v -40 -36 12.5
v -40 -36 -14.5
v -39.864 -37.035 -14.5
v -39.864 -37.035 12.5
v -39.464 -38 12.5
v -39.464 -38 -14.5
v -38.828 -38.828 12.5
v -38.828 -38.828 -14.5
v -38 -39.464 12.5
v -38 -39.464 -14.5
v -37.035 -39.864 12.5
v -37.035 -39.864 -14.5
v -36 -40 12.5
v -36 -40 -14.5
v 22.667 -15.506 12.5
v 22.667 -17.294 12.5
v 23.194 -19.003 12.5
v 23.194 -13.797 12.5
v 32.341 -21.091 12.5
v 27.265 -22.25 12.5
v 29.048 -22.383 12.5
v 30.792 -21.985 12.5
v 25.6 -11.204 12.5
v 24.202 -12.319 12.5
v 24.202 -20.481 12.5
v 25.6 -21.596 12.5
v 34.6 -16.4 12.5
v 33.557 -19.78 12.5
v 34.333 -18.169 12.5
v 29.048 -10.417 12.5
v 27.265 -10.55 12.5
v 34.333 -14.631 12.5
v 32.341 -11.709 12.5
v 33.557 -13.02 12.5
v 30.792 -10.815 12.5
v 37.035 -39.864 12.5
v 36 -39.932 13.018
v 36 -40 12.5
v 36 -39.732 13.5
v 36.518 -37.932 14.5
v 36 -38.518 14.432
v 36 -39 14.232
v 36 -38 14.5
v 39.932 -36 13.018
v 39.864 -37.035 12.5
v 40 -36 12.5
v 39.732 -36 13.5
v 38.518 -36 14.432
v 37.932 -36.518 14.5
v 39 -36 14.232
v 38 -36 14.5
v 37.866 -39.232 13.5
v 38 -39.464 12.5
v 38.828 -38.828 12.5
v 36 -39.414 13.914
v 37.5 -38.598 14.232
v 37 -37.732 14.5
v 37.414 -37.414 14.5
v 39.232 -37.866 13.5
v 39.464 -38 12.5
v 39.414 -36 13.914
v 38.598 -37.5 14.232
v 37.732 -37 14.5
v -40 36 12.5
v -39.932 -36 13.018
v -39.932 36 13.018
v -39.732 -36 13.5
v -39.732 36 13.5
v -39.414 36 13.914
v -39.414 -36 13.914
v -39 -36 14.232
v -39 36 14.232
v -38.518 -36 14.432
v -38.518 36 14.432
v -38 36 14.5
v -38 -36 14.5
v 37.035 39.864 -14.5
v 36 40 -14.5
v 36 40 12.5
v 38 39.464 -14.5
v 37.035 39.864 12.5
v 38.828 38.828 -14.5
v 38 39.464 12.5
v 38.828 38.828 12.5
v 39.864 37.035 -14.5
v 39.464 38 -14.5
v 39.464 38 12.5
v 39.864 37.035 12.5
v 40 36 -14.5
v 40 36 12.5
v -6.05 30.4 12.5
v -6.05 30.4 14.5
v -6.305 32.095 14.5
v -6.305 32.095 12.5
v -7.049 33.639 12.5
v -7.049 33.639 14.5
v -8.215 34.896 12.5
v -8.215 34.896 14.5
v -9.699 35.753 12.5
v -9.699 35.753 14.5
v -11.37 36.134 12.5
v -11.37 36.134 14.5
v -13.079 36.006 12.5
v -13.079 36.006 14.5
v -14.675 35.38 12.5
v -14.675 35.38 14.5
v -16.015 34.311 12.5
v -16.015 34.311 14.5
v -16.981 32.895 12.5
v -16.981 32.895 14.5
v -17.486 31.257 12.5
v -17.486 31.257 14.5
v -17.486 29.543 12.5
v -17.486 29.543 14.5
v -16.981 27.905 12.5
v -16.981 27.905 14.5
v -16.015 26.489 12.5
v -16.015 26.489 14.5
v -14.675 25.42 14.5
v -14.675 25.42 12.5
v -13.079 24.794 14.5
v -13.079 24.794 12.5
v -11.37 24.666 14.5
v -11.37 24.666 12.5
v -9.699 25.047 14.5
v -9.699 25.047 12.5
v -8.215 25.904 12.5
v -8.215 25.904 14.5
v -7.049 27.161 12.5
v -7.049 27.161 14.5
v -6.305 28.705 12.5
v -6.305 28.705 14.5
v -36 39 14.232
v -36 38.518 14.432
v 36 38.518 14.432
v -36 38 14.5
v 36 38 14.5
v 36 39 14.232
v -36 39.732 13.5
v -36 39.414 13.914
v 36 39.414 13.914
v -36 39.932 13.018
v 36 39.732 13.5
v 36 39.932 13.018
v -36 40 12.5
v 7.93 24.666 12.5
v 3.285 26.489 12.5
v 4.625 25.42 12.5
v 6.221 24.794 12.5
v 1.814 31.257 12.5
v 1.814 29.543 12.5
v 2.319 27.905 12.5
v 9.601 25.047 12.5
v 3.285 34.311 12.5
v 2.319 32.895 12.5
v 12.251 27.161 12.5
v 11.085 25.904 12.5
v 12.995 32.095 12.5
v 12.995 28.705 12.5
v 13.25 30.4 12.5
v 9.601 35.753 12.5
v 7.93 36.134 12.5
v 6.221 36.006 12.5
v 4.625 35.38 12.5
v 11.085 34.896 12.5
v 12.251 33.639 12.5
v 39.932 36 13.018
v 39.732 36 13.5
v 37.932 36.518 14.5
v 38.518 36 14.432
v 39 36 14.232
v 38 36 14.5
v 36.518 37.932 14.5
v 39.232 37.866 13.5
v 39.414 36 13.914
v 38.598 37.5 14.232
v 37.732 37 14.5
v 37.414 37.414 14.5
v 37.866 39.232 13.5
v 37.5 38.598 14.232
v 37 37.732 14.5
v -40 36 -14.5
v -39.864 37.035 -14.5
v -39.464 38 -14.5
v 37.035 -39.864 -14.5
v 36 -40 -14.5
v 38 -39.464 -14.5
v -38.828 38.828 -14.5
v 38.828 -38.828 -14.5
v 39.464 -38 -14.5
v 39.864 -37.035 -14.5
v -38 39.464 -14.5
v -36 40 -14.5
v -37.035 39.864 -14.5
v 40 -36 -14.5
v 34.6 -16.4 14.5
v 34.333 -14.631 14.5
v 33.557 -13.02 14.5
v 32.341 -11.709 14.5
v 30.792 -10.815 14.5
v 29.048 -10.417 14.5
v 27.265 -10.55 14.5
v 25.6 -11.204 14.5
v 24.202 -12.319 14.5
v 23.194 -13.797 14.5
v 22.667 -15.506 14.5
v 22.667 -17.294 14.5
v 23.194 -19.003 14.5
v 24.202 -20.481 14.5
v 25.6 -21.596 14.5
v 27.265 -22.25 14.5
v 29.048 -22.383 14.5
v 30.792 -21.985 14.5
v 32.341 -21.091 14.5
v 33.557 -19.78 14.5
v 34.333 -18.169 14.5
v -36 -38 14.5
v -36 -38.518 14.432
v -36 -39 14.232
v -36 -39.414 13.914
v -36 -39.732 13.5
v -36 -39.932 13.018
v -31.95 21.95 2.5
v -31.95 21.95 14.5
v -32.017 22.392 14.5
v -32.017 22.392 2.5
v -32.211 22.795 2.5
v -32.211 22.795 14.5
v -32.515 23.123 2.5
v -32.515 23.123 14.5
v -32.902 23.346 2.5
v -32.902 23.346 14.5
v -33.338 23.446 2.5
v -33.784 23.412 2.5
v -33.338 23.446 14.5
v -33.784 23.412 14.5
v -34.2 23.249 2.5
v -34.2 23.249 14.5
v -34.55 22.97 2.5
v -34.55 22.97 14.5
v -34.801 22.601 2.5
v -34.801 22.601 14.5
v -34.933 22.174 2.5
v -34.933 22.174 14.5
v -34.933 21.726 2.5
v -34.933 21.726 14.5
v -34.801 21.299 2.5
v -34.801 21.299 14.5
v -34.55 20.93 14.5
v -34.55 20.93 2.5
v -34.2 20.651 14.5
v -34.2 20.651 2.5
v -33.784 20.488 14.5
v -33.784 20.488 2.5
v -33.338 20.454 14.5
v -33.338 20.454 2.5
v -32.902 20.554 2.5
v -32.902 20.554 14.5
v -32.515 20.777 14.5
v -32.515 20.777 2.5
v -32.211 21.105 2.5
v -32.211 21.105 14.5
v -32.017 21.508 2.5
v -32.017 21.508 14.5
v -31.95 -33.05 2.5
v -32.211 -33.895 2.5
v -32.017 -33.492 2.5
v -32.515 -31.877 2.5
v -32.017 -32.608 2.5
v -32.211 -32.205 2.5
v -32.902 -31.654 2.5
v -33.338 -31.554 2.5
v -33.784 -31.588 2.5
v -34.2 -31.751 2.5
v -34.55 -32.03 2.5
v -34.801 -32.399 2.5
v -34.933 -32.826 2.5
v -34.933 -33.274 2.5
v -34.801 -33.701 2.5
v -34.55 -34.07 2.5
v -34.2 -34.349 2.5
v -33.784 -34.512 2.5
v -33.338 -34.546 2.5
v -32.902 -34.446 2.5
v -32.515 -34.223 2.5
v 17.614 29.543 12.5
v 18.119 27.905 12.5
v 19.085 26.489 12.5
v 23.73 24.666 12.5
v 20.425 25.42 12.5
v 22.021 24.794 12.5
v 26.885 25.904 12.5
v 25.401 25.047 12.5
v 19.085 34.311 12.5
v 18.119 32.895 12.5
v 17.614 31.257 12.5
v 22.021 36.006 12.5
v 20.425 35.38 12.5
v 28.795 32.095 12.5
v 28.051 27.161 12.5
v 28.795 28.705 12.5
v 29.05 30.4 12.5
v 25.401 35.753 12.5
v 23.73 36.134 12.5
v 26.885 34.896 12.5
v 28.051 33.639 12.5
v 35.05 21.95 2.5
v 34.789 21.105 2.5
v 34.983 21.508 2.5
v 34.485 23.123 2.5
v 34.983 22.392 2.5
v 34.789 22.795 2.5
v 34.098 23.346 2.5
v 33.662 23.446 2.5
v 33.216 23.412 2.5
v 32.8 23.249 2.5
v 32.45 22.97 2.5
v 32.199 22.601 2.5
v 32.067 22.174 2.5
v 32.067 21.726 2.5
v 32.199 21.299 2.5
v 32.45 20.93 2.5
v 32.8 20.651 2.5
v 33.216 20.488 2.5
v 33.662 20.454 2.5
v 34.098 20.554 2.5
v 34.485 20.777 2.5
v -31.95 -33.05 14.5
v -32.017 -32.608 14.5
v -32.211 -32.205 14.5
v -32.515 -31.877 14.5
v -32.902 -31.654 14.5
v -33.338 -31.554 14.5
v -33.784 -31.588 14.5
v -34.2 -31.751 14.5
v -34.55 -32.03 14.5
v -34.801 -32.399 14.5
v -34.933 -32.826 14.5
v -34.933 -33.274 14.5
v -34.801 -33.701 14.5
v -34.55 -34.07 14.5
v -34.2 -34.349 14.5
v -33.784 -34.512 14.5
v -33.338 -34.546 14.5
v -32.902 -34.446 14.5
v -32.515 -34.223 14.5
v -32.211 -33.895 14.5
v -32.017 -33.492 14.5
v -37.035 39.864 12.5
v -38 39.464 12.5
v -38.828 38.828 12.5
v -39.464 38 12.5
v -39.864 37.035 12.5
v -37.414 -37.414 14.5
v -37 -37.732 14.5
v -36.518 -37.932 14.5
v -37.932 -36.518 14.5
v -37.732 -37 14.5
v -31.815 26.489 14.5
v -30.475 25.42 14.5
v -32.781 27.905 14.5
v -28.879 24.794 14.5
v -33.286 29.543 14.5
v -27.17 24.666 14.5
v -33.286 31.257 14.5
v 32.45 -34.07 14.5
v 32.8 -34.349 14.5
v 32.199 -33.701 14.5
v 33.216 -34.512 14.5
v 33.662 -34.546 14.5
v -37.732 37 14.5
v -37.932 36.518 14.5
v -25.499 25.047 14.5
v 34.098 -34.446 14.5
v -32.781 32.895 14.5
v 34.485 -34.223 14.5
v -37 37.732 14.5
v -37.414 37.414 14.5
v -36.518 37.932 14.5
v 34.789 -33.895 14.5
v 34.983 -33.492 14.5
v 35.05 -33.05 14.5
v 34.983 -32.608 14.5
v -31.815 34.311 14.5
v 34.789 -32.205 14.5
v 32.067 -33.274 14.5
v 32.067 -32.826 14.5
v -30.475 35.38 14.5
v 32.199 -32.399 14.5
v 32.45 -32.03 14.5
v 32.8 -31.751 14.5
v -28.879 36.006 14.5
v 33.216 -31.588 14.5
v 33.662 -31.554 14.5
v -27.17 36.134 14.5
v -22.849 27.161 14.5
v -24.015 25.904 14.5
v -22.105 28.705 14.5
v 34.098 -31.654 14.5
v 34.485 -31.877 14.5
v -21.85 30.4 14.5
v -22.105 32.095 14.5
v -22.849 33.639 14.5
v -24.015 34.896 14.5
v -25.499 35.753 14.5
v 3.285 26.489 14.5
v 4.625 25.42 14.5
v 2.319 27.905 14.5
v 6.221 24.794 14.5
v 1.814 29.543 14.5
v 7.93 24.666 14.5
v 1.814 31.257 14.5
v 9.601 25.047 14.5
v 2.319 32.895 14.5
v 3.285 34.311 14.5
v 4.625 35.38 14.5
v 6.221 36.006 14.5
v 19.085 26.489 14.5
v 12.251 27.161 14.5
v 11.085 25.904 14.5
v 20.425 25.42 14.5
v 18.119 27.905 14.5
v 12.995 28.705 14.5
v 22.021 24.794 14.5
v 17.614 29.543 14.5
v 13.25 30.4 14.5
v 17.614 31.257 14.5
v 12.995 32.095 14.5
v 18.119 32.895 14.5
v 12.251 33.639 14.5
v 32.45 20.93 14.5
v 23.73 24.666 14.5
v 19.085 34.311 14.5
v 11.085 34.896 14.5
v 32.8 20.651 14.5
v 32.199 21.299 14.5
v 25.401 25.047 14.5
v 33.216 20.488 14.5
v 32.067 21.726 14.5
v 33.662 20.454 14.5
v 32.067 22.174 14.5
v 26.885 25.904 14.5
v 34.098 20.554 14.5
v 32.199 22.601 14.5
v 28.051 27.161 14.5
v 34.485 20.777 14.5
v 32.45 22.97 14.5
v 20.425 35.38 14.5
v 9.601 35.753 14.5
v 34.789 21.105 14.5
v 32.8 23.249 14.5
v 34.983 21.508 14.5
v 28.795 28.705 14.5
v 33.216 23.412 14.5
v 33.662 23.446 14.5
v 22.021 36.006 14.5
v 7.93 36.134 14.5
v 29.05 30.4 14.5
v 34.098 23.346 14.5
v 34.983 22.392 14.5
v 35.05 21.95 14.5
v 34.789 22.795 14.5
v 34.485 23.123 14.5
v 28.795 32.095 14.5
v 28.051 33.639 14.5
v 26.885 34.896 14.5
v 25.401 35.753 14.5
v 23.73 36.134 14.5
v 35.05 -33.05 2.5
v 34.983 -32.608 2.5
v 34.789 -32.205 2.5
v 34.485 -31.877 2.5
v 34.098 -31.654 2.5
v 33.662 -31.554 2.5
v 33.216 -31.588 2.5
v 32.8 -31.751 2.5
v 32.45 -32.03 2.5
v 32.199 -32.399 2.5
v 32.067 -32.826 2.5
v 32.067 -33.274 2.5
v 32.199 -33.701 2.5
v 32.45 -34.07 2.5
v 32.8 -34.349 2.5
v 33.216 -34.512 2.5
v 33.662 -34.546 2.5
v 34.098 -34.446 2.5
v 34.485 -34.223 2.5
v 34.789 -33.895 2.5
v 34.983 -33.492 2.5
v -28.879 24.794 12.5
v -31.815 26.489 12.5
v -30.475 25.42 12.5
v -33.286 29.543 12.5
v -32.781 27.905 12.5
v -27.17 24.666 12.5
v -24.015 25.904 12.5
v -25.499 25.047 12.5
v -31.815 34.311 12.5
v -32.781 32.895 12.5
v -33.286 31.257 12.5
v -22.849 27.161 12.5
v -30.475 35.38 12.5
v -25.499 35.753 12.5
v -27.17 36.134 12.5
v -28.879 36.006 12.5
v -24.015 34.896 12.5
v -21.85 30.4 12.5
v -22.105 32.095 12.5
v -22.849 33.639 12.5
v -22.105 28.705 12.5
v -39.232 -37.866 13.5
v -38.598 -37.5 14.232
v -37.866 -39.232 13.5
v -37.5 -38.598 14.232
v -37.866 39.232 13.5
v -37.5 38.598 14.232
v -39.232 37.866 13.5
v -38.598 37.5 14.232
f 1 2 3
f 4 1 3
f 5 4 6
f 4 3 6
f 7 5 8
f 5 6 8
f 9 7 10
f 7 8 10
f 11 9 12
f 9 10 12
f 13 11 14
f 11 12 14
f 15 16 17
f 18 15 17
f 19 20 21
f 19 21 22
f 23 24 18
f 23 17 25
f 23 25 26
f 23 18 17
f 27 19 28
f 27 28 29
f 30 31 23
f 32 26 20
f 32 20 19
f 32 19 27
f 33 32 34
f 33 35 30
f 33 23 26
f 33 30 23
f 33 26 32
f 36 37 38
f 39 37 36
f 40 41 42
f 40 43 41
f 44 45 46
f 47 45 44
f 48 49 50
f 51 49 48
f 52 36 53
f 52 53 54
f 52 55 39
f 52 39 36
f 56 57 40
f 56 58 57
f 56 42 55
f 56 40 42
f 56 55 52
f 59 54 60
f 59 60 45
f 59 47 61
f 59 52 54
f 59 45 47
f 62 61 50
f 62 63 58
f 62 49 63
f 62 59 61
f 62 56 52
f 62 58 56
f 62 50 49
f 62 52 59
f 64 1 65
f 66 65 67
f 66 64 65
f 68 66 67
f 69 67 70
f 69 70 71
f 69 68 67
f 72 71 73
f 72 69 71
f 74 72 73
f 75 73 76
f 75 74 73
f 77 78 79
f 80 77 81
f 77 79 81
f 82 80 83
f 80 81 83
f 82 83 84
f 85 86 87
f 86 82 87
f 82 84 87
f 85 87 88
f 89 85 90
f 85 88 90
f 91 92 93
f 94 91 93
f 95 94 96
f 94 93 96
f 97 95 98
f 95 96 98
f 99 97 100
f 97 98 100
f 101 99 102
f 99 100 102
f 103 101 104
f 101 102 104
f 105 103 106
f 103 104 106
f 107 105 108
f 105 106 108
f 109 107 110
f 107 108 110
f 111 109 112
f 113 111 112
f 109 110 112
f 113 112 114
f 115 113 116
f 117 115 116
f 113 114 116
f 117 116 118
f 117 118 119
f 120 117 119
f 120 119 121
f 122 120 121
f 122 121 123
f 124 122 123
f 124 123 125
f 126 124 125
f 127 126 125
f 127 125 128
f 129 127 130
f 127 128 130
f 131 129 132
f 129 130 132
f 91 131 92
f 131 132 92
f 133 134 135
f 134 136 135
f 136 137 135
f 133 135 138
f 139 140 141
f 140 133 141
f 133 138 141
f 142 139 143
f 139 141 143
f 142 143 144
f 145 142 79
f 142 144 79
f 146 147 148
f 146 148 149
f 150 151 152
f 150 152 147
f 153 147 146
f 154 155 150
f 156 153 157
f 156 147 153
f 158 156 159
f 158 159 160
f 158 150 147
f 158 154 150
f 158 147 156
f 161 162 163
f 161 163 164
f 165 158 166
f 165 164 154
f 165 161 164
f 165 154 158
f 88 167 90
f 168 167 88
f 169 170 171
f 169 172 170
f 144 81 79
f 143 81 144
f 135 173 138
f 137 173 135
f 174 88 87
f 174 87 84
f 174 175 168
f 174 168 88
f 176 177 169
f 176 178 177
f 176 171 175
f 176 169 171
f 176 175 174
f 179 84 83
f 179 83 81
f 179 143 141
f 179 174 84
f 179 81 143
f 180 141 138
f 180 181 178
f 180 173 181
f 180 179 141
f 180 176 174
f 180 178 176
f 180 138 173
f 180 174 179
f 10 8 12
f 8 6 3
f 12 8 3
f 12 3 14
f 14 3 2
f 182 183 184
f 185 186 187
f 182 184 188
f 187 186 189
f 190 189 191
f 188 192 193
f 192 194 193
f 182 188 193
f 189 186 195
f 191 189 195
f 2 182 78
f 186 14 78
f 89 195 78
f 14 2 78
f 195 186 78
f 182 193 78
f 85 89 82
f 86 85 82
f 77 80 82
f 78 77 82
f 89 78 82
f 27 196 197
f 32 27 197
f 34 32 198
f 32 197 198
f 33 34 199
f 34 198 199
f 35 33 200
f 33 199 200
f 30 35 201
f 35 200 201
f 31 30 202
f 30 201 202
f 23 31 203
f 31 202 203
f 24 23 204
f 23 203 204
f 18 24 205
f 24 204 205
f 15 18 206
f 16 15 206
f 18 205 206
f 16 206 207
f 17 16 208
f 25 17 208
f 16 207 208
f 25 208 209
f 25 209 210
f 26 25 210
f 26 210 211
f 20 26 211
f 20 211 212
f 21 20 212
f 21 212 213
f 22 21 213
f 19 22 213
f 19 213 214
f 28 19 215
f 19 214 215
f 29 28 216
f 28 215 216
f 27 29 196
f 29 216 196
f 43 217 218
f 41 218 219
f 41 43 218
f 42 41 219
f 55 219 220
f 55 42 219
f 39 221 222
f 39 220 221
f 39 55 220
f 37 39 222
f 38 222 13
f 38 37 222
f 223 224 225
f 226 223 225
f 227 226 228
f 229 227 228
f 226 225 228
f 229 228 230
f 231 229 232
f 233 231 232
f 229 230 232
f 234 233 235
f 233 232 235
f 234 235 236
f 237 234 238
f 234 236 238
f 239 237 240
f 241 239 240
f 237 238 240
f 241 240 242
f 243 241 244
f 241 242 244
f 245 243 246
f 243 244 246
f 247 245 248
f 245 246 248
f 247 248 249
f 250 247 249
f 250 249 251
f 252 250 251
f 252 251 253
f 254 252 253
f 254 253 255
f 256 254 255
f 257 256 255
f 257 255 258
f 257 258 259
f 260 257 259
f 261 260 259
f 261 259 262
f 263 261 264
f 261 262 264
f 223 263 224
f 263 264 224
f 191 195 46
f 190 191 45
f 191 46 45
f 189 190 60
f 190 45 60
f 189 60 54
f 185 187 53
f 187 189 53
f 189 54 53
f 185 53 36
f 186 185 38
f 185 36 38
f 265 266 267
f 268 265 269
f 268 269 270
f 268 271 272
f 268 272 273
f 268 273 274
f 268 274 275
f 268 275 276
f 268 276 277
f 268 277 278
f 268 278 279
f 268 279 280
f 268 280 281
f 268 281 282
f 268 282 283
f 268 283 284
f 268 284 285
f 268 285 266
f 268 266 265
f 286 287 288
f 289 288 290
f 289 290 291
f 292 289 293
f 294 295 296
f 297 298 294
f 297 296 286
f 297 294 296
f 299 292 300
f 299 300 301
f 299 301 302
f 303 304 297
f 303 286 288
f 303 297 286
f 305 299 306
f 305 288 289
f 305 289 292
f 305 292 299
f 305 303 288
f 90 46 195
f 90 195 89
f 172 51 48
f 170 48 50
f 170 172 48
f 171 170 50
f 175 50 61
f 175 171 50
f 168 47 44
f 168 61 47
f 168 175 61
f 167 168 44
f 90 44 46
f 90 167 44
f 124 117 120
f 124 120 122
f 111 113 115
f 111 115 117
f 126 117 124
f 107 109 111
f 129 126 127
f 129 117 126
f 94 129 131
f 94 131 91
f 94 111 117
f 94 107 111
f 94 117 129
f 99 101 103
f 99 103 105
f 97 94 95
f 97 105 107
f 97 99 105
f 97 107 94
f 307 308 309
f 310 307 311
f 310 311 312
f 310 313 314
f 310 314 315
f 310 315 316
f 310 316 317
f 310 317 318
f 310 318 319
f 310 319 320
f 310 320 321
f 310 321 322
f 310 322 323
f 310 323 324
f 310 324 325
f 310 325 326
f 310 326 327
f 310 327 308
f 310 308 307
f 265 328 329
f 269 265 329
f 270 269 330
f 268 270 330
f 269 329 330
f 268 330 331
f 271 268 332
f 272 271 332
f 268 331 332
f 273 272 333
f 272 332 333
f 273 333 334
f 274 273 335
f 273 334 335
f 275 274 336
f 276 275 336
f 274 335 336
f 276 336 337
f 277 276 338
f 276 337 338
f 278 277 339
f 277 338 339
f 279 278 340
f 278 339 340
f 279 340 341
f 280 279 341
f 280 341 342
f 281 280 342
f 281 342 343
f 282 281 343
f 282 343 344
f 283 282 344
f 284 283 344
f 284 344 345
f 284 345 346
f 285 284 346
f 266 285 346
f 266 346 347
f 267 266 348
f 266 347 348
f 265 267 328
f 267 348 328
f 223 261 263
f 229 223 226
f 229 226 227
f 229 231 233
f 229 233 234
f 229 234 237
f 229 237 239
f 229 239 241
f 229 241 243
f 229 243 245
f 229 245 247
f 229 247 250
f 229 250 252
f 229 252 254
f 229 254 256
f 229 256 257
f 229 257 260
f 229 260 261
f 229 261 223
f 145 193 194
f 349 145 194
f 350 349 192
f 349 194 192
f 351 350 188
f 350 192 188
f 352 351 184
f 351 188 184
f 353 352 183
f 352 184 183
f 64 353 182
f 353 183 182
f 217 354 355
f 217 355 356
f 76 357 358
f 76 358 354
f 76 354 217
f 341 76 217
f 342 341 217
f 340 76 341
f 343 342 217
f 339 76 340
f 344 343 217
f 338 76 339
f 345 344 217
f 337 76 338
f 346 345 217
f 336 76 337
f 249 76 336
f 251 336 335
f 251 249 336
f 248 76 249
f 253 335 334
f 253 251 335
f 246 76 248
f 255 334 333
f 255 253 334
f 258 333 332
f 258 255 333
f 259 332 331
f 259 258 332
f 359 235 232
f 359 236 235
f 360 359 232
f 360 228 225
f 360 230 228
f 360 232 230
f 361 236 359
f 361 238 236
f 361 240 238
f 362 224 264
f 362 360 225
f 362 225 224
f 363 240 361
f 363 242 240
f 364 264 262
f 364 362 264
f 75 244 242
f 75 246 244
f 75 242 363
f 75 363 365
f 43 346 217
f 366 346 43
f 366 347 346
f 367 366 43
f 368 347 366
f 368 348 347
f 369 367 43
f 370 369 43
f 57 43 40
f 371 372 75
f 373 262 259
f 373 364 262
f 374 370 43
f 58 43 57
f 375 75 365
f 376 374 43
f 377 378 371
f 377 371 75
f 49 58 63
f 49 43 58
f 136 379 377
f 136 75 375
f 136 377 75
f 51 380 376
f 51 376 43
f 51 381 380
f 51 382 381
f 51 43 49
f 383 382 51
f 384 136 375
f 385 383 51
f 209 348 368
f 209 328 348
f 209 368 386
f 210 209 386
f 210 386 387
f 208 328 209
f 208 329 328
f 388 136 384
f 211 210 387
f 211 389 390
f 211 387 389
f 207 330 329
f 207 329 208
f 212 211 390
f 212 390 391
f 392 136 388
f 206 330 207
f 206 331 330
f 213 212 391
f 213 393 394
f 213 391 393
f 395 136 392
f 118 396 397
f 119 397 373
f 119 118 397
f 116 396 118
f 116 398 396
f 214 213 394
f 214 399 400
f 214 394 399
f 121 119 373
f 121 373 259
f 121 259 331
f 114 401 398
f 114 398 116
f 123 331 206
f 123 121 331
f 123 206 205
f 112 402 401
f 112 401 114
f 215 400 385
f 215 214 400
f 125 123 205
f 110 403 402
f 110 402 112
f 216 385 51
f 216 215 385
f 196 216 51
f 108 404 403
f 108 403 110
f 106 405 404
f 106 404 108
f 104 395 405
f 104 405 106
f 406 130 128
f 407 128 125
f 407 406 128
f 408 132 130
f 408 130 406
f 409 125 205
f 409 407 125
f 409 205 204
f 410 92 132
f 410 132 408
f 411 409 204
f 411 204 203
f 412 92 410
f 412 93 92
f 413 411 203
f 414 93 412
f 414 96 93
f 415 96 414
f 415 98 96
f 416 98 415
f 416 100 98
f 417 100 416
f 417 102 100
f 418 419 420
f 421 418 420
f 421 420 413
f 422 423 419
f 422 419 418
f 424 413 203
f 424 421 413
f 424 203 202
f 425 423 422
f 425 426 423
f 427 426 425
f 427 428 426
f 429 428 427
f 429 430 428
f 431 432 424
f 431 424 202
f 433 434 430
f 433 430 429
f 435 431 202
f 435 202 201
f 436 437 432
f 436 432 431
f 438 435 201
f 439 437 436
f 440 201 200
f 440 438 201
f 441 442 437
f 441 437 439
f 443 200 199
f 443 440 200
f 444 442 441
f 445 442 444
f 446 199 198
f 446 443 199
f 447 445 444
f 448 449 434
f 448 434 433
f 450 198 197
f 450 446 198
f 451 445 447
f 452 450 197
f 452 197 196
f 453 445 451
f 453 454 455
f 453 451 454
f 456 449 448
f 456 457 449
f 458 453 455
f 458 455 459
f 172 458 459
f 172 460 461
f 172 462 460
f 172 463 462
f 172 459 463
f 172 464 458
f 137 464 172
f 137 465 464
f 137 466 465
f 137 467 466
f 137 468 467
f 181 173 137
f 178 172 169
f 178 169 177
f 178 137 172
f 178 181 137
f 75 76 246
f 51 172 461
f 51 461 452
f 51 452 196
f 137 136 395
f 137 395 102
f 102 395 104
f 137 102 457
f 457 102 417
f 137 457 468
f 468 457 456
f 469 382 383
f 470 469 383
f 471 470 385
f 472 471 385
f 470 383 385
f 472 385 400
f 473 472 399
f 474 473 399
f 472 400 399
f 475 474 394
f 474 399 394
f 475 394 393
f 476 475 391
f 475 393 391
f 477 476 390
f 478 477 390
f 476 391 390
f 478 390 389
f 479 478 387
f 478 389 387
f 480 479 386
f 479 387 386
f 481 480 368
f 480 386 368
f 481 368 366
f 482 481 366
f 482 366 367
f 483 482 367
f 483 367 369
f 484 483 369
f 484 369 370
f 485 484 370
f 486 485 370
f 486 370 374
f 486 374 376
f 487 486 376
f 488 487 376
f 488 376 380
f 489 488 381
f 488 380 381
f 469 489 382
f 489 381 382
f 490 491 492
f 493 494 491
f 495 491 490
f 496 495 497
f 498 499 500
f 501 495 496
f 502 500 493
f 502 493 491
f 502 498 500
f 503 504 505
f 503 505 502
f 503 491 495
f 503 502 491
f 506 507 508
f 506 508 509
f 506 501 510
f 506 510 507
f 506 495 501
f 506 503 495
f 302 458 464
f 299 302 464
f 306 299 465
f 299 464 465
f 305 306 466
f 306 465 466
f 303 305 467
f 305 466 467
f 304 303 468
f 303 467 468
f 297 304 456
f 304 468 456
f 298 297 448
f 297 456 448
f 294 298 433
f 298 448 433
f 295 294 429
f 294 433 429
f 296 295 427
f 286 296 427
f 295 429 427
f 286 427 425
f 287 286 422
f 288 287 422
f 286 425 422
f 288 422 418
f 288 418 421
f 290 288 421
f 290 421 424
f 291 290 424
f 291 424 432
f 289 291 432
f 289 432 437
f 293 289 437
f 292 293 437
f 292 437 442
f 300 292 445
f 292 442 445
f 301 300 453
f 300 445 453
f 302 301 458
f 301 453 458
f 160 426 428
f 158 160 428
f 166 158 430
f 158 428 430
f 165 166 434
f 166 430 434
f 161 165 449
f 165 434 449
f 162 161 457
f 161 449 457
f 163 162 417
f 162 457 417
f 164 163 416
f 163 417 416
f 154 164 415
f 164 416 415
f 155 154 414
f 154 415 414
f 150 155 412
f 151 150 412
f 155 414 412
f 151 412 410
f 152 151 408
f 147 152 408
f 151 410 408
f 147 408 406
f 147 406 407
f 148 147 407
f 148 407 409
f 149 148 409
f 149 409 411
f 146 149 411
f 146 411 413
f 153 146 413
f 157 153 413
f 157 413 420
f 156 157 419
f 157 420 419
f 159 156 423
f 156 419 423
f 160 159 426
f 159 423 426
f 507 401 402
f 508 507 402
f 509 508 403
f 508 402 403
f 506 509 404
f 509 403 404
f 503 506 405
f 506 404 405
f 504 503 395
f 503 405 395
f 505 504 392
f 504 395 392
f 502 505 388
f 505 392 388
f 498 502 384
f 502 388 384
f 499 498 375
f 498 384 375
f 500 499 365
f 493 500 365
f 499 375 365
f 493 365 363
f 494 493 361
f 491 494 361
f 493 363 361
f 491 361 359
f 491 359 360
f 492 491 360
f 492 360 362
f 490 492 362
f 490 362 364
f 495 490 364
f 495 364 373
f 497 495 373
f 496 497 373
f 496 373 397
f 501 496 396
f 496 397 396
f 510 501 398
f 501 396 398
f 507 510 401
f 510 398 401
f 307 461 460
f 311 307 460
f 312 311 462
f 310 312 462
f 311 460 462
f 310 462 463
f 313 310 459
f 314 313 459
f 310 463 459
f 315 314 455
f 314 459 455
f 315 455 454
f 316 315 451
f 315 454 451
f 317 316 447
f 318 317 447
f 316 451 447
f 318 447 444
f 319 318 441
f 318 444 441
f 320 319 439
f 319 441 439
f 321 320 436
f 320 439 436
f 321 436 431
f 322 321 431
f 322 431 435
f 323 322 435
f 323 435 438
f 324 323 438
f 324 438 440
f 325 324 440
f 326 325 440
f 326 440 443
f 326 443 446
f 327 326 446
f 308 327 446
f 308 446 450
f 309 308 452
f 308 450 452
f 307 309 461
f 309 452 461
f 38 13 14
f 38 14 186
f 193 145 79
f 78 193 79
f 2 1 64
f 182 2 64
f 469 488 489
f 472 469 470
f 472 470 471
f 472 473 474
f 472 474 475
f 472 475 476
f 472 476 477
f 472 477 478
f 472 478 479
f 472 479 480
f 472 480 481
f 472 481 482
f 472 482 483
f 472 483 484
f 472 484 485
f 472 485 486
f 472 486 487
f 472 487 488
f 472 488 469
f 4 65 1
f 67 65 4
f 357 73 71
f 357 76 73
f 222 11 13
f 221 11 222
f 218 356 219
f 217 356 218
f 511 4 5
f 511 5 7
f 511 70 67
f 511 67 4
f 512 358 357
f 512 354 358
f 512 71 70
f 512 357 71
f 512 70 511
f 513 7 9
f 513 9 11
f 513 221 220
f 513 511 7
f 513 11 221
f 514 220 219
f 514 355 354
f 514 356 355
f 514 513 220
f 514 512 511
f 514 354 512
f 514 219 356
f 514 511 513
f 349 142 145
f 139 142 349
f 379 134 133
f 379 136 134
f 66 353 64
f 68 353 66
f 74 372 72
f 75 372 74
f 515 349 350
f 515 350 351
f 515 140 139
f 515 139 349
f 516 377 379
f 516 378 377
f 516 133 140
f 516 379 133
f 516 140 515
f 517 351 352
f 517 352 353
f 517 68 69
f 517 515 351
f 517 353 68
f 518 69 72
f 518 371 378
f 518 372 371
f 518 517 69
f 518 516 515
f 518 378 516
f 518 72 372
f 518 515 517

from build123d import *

# Parameters (mm, degrees)
SKETCH1_W           = 80
SKETCH1_H           = 80
BOSS_EXTRUDE1_DEPTH = 14.5
FILLET1_R           = 2
FILLET2_R           = 4
SKETCH2_R           = 5.75
CUT_EXTRUDE1_DEPTH  = 2
SKETCH3_R           = 1.5
CUT_EXTRUDE2_DEPTH  = 12
SKETCH6_R           = 6
CUT_EXTRUDE3_DEPTH  = 2


with BuildPart() as part:
    # Sketch1 → Boss-Extrude1 (new, symmetric)
    with BuildSketch(Plane.XY):
        Rectangle(SKETCH1_W, SKETCH1_H)
    extrude(amount=BOSS_EXTRUDE1_DEPTH, both=True)

    # Fillet1
    fillet1_edges = [part.edges().sort_by_distance(p)[0] for p in [
        (-40, 0, 14.5),
        (0, -40, 14.5),
        (40, 0, 14.5),
        (0, 40, 14.5),
    ]]
    fillet(fillet1_edges, radius=FILLET1_R)

    # Fillet2
    # the kernel refuses this fillet: 4 mm, written as the material it takes off along each edge
    with BuildSketch(Plane(origin=(-36, -36, 14.5), x_dir=(-1, 0, 0), z_dir=(0, 1, 0))) as fillet2_piece_1:
        with BuildLine():
            CenterArc((2, -2), 2, 0, 90)
            Line((4, -2), (4, 0))
            Line((4, 0), (2, 0))
        make_face()
    revolve(axis=Axis((-36, -36, 14.5), (0, 0, 1)), revolution_arc=90, mode=Mode.SUBTRACT)
    with BuildSketch(Plane(origin=(-36, 36, 14.5), x_dir=(0, 1, 0), z_dir=(1, 0, 0))) as fillet2_piece_2:
        with BuildLine():
            CenterArc((2, -2), 2, 0, 90)
            Line((4, -2), (4, 0))
            Line((4, 0), (2, 0))
        make_face()
    revolve(axis=Axis((-36, 36, 14.5), (0, 0, 1)), revolution_arc=90, mode=Mode.SUBTRACT)
    with BuildSketch(Plane(origin=(36, -36, 14.5), x_dir=(0, -1, 0), z_dir=(-1, 0, 0))) as fillet2_piece_3:
        with BuildLine():
            CenterArc((2, -2), 2, 0, 90)
            Line((4, -2), (4, 0))
            Line((4, 0), (2, 0))
        make_face()
    revolve(axis=Axis((36, -36, 14.5), (0, 0, 1)), revolution_arc=90, mode=Mode.SUBTRACT)
    with BuildSketch(Plane(origin=(36, 36, 14.5), x_dir=(1, 0, 0), z_dir=(0, -1, 0))) as fillet2_piece_4:
        with BuildLine():
            CenterArc((2, -2), 2, 0, 90)
            Line((4, -2), (4, 0))
            Line((4, 0), (2, 0))
        make_face()
    revolve(axis=Axis((36, 36, 14.5), (0, 0, 1)), revolution_arc=90, mode=Mode.SUBTRACT)
    with BuildSketch(Plane(origin=(40, 40, 14.5), x_dir=(-1, 0, 0), z_dir=(0, 0, -1)), Plane(origin=(40, -40, 14.5), x_dir=(0, 1, 0), z_dir=(0, 0, -1)), Plane(origin=(-40, -40, -24.5), x_dir=(0, 1, 0), z_dir=(0, 0, 1)), Plane(origin=(-40, 40, -24.5), x_dir=(1, 0, 0), z_dir=(0, 0, 1))) as fillet2_piece_5:
        with BuildLine():
            CenterArc((FILLET2_R, -FILLET2_R), FILLET2_R, 90, 90)
            Line((0, -FILLET2_R), (0, 0))
            Line((0, 0), (FILLET2_R, 0))
        make_face()
    extrude(amount=39, mode=Mode.SUBTRACT)

    # Sketch2 → Cut-Extrude1 (cut)
    with BuildSketch(Plane.XY.offset(14.5)):
        with Locations((-27.6, 30.4)):
            Circle(SKETCH2_R)
        with Locations((-11.8, 30.4)):
            Circle(SKETCH2_R)
        with Locations((7.5, 30.4)):
            Circle(SKETCH2_R)
        with Locations((23.3, 30.4)):
            Circle(SKETCH2_R)
    extrude(amount=-CUT_EXTRUDE1_DEPTH, mode=Mode.SUBTRACT)

    # Sketch3 → Cut-Extrude2 (cut)
    with BuildSketch(Plane.XY.offset(14.5)):
        with Locations((-33.45, 21.95)):
            Circle(SKETCH3_R)
        with Locations((33.55, 21.95)):
            Circle(SKETCH3_R)
        with Locations((-33.45, -33.05)):
            Circle(SKETCH3_R)
        with Locations((33.55, -33.05)):
            Circle(SKETCH3_R)
    extrude(amount=-CUT_EXTRUDE2_DEPTH, mode=Mode.SUBTRACT)

    # Sketch6 → Cut-Extrude3 (cut)
    with BuildSketch(Plane.XY.offset(14.5)):
        with Locations((28.6, -16.4)):
            Circle(SKETCH6_R)
    extrude(amount=-CUT_EXTRUDE3_DEPTH, mode=Mode.SUBTRACT)


solid = part.part
